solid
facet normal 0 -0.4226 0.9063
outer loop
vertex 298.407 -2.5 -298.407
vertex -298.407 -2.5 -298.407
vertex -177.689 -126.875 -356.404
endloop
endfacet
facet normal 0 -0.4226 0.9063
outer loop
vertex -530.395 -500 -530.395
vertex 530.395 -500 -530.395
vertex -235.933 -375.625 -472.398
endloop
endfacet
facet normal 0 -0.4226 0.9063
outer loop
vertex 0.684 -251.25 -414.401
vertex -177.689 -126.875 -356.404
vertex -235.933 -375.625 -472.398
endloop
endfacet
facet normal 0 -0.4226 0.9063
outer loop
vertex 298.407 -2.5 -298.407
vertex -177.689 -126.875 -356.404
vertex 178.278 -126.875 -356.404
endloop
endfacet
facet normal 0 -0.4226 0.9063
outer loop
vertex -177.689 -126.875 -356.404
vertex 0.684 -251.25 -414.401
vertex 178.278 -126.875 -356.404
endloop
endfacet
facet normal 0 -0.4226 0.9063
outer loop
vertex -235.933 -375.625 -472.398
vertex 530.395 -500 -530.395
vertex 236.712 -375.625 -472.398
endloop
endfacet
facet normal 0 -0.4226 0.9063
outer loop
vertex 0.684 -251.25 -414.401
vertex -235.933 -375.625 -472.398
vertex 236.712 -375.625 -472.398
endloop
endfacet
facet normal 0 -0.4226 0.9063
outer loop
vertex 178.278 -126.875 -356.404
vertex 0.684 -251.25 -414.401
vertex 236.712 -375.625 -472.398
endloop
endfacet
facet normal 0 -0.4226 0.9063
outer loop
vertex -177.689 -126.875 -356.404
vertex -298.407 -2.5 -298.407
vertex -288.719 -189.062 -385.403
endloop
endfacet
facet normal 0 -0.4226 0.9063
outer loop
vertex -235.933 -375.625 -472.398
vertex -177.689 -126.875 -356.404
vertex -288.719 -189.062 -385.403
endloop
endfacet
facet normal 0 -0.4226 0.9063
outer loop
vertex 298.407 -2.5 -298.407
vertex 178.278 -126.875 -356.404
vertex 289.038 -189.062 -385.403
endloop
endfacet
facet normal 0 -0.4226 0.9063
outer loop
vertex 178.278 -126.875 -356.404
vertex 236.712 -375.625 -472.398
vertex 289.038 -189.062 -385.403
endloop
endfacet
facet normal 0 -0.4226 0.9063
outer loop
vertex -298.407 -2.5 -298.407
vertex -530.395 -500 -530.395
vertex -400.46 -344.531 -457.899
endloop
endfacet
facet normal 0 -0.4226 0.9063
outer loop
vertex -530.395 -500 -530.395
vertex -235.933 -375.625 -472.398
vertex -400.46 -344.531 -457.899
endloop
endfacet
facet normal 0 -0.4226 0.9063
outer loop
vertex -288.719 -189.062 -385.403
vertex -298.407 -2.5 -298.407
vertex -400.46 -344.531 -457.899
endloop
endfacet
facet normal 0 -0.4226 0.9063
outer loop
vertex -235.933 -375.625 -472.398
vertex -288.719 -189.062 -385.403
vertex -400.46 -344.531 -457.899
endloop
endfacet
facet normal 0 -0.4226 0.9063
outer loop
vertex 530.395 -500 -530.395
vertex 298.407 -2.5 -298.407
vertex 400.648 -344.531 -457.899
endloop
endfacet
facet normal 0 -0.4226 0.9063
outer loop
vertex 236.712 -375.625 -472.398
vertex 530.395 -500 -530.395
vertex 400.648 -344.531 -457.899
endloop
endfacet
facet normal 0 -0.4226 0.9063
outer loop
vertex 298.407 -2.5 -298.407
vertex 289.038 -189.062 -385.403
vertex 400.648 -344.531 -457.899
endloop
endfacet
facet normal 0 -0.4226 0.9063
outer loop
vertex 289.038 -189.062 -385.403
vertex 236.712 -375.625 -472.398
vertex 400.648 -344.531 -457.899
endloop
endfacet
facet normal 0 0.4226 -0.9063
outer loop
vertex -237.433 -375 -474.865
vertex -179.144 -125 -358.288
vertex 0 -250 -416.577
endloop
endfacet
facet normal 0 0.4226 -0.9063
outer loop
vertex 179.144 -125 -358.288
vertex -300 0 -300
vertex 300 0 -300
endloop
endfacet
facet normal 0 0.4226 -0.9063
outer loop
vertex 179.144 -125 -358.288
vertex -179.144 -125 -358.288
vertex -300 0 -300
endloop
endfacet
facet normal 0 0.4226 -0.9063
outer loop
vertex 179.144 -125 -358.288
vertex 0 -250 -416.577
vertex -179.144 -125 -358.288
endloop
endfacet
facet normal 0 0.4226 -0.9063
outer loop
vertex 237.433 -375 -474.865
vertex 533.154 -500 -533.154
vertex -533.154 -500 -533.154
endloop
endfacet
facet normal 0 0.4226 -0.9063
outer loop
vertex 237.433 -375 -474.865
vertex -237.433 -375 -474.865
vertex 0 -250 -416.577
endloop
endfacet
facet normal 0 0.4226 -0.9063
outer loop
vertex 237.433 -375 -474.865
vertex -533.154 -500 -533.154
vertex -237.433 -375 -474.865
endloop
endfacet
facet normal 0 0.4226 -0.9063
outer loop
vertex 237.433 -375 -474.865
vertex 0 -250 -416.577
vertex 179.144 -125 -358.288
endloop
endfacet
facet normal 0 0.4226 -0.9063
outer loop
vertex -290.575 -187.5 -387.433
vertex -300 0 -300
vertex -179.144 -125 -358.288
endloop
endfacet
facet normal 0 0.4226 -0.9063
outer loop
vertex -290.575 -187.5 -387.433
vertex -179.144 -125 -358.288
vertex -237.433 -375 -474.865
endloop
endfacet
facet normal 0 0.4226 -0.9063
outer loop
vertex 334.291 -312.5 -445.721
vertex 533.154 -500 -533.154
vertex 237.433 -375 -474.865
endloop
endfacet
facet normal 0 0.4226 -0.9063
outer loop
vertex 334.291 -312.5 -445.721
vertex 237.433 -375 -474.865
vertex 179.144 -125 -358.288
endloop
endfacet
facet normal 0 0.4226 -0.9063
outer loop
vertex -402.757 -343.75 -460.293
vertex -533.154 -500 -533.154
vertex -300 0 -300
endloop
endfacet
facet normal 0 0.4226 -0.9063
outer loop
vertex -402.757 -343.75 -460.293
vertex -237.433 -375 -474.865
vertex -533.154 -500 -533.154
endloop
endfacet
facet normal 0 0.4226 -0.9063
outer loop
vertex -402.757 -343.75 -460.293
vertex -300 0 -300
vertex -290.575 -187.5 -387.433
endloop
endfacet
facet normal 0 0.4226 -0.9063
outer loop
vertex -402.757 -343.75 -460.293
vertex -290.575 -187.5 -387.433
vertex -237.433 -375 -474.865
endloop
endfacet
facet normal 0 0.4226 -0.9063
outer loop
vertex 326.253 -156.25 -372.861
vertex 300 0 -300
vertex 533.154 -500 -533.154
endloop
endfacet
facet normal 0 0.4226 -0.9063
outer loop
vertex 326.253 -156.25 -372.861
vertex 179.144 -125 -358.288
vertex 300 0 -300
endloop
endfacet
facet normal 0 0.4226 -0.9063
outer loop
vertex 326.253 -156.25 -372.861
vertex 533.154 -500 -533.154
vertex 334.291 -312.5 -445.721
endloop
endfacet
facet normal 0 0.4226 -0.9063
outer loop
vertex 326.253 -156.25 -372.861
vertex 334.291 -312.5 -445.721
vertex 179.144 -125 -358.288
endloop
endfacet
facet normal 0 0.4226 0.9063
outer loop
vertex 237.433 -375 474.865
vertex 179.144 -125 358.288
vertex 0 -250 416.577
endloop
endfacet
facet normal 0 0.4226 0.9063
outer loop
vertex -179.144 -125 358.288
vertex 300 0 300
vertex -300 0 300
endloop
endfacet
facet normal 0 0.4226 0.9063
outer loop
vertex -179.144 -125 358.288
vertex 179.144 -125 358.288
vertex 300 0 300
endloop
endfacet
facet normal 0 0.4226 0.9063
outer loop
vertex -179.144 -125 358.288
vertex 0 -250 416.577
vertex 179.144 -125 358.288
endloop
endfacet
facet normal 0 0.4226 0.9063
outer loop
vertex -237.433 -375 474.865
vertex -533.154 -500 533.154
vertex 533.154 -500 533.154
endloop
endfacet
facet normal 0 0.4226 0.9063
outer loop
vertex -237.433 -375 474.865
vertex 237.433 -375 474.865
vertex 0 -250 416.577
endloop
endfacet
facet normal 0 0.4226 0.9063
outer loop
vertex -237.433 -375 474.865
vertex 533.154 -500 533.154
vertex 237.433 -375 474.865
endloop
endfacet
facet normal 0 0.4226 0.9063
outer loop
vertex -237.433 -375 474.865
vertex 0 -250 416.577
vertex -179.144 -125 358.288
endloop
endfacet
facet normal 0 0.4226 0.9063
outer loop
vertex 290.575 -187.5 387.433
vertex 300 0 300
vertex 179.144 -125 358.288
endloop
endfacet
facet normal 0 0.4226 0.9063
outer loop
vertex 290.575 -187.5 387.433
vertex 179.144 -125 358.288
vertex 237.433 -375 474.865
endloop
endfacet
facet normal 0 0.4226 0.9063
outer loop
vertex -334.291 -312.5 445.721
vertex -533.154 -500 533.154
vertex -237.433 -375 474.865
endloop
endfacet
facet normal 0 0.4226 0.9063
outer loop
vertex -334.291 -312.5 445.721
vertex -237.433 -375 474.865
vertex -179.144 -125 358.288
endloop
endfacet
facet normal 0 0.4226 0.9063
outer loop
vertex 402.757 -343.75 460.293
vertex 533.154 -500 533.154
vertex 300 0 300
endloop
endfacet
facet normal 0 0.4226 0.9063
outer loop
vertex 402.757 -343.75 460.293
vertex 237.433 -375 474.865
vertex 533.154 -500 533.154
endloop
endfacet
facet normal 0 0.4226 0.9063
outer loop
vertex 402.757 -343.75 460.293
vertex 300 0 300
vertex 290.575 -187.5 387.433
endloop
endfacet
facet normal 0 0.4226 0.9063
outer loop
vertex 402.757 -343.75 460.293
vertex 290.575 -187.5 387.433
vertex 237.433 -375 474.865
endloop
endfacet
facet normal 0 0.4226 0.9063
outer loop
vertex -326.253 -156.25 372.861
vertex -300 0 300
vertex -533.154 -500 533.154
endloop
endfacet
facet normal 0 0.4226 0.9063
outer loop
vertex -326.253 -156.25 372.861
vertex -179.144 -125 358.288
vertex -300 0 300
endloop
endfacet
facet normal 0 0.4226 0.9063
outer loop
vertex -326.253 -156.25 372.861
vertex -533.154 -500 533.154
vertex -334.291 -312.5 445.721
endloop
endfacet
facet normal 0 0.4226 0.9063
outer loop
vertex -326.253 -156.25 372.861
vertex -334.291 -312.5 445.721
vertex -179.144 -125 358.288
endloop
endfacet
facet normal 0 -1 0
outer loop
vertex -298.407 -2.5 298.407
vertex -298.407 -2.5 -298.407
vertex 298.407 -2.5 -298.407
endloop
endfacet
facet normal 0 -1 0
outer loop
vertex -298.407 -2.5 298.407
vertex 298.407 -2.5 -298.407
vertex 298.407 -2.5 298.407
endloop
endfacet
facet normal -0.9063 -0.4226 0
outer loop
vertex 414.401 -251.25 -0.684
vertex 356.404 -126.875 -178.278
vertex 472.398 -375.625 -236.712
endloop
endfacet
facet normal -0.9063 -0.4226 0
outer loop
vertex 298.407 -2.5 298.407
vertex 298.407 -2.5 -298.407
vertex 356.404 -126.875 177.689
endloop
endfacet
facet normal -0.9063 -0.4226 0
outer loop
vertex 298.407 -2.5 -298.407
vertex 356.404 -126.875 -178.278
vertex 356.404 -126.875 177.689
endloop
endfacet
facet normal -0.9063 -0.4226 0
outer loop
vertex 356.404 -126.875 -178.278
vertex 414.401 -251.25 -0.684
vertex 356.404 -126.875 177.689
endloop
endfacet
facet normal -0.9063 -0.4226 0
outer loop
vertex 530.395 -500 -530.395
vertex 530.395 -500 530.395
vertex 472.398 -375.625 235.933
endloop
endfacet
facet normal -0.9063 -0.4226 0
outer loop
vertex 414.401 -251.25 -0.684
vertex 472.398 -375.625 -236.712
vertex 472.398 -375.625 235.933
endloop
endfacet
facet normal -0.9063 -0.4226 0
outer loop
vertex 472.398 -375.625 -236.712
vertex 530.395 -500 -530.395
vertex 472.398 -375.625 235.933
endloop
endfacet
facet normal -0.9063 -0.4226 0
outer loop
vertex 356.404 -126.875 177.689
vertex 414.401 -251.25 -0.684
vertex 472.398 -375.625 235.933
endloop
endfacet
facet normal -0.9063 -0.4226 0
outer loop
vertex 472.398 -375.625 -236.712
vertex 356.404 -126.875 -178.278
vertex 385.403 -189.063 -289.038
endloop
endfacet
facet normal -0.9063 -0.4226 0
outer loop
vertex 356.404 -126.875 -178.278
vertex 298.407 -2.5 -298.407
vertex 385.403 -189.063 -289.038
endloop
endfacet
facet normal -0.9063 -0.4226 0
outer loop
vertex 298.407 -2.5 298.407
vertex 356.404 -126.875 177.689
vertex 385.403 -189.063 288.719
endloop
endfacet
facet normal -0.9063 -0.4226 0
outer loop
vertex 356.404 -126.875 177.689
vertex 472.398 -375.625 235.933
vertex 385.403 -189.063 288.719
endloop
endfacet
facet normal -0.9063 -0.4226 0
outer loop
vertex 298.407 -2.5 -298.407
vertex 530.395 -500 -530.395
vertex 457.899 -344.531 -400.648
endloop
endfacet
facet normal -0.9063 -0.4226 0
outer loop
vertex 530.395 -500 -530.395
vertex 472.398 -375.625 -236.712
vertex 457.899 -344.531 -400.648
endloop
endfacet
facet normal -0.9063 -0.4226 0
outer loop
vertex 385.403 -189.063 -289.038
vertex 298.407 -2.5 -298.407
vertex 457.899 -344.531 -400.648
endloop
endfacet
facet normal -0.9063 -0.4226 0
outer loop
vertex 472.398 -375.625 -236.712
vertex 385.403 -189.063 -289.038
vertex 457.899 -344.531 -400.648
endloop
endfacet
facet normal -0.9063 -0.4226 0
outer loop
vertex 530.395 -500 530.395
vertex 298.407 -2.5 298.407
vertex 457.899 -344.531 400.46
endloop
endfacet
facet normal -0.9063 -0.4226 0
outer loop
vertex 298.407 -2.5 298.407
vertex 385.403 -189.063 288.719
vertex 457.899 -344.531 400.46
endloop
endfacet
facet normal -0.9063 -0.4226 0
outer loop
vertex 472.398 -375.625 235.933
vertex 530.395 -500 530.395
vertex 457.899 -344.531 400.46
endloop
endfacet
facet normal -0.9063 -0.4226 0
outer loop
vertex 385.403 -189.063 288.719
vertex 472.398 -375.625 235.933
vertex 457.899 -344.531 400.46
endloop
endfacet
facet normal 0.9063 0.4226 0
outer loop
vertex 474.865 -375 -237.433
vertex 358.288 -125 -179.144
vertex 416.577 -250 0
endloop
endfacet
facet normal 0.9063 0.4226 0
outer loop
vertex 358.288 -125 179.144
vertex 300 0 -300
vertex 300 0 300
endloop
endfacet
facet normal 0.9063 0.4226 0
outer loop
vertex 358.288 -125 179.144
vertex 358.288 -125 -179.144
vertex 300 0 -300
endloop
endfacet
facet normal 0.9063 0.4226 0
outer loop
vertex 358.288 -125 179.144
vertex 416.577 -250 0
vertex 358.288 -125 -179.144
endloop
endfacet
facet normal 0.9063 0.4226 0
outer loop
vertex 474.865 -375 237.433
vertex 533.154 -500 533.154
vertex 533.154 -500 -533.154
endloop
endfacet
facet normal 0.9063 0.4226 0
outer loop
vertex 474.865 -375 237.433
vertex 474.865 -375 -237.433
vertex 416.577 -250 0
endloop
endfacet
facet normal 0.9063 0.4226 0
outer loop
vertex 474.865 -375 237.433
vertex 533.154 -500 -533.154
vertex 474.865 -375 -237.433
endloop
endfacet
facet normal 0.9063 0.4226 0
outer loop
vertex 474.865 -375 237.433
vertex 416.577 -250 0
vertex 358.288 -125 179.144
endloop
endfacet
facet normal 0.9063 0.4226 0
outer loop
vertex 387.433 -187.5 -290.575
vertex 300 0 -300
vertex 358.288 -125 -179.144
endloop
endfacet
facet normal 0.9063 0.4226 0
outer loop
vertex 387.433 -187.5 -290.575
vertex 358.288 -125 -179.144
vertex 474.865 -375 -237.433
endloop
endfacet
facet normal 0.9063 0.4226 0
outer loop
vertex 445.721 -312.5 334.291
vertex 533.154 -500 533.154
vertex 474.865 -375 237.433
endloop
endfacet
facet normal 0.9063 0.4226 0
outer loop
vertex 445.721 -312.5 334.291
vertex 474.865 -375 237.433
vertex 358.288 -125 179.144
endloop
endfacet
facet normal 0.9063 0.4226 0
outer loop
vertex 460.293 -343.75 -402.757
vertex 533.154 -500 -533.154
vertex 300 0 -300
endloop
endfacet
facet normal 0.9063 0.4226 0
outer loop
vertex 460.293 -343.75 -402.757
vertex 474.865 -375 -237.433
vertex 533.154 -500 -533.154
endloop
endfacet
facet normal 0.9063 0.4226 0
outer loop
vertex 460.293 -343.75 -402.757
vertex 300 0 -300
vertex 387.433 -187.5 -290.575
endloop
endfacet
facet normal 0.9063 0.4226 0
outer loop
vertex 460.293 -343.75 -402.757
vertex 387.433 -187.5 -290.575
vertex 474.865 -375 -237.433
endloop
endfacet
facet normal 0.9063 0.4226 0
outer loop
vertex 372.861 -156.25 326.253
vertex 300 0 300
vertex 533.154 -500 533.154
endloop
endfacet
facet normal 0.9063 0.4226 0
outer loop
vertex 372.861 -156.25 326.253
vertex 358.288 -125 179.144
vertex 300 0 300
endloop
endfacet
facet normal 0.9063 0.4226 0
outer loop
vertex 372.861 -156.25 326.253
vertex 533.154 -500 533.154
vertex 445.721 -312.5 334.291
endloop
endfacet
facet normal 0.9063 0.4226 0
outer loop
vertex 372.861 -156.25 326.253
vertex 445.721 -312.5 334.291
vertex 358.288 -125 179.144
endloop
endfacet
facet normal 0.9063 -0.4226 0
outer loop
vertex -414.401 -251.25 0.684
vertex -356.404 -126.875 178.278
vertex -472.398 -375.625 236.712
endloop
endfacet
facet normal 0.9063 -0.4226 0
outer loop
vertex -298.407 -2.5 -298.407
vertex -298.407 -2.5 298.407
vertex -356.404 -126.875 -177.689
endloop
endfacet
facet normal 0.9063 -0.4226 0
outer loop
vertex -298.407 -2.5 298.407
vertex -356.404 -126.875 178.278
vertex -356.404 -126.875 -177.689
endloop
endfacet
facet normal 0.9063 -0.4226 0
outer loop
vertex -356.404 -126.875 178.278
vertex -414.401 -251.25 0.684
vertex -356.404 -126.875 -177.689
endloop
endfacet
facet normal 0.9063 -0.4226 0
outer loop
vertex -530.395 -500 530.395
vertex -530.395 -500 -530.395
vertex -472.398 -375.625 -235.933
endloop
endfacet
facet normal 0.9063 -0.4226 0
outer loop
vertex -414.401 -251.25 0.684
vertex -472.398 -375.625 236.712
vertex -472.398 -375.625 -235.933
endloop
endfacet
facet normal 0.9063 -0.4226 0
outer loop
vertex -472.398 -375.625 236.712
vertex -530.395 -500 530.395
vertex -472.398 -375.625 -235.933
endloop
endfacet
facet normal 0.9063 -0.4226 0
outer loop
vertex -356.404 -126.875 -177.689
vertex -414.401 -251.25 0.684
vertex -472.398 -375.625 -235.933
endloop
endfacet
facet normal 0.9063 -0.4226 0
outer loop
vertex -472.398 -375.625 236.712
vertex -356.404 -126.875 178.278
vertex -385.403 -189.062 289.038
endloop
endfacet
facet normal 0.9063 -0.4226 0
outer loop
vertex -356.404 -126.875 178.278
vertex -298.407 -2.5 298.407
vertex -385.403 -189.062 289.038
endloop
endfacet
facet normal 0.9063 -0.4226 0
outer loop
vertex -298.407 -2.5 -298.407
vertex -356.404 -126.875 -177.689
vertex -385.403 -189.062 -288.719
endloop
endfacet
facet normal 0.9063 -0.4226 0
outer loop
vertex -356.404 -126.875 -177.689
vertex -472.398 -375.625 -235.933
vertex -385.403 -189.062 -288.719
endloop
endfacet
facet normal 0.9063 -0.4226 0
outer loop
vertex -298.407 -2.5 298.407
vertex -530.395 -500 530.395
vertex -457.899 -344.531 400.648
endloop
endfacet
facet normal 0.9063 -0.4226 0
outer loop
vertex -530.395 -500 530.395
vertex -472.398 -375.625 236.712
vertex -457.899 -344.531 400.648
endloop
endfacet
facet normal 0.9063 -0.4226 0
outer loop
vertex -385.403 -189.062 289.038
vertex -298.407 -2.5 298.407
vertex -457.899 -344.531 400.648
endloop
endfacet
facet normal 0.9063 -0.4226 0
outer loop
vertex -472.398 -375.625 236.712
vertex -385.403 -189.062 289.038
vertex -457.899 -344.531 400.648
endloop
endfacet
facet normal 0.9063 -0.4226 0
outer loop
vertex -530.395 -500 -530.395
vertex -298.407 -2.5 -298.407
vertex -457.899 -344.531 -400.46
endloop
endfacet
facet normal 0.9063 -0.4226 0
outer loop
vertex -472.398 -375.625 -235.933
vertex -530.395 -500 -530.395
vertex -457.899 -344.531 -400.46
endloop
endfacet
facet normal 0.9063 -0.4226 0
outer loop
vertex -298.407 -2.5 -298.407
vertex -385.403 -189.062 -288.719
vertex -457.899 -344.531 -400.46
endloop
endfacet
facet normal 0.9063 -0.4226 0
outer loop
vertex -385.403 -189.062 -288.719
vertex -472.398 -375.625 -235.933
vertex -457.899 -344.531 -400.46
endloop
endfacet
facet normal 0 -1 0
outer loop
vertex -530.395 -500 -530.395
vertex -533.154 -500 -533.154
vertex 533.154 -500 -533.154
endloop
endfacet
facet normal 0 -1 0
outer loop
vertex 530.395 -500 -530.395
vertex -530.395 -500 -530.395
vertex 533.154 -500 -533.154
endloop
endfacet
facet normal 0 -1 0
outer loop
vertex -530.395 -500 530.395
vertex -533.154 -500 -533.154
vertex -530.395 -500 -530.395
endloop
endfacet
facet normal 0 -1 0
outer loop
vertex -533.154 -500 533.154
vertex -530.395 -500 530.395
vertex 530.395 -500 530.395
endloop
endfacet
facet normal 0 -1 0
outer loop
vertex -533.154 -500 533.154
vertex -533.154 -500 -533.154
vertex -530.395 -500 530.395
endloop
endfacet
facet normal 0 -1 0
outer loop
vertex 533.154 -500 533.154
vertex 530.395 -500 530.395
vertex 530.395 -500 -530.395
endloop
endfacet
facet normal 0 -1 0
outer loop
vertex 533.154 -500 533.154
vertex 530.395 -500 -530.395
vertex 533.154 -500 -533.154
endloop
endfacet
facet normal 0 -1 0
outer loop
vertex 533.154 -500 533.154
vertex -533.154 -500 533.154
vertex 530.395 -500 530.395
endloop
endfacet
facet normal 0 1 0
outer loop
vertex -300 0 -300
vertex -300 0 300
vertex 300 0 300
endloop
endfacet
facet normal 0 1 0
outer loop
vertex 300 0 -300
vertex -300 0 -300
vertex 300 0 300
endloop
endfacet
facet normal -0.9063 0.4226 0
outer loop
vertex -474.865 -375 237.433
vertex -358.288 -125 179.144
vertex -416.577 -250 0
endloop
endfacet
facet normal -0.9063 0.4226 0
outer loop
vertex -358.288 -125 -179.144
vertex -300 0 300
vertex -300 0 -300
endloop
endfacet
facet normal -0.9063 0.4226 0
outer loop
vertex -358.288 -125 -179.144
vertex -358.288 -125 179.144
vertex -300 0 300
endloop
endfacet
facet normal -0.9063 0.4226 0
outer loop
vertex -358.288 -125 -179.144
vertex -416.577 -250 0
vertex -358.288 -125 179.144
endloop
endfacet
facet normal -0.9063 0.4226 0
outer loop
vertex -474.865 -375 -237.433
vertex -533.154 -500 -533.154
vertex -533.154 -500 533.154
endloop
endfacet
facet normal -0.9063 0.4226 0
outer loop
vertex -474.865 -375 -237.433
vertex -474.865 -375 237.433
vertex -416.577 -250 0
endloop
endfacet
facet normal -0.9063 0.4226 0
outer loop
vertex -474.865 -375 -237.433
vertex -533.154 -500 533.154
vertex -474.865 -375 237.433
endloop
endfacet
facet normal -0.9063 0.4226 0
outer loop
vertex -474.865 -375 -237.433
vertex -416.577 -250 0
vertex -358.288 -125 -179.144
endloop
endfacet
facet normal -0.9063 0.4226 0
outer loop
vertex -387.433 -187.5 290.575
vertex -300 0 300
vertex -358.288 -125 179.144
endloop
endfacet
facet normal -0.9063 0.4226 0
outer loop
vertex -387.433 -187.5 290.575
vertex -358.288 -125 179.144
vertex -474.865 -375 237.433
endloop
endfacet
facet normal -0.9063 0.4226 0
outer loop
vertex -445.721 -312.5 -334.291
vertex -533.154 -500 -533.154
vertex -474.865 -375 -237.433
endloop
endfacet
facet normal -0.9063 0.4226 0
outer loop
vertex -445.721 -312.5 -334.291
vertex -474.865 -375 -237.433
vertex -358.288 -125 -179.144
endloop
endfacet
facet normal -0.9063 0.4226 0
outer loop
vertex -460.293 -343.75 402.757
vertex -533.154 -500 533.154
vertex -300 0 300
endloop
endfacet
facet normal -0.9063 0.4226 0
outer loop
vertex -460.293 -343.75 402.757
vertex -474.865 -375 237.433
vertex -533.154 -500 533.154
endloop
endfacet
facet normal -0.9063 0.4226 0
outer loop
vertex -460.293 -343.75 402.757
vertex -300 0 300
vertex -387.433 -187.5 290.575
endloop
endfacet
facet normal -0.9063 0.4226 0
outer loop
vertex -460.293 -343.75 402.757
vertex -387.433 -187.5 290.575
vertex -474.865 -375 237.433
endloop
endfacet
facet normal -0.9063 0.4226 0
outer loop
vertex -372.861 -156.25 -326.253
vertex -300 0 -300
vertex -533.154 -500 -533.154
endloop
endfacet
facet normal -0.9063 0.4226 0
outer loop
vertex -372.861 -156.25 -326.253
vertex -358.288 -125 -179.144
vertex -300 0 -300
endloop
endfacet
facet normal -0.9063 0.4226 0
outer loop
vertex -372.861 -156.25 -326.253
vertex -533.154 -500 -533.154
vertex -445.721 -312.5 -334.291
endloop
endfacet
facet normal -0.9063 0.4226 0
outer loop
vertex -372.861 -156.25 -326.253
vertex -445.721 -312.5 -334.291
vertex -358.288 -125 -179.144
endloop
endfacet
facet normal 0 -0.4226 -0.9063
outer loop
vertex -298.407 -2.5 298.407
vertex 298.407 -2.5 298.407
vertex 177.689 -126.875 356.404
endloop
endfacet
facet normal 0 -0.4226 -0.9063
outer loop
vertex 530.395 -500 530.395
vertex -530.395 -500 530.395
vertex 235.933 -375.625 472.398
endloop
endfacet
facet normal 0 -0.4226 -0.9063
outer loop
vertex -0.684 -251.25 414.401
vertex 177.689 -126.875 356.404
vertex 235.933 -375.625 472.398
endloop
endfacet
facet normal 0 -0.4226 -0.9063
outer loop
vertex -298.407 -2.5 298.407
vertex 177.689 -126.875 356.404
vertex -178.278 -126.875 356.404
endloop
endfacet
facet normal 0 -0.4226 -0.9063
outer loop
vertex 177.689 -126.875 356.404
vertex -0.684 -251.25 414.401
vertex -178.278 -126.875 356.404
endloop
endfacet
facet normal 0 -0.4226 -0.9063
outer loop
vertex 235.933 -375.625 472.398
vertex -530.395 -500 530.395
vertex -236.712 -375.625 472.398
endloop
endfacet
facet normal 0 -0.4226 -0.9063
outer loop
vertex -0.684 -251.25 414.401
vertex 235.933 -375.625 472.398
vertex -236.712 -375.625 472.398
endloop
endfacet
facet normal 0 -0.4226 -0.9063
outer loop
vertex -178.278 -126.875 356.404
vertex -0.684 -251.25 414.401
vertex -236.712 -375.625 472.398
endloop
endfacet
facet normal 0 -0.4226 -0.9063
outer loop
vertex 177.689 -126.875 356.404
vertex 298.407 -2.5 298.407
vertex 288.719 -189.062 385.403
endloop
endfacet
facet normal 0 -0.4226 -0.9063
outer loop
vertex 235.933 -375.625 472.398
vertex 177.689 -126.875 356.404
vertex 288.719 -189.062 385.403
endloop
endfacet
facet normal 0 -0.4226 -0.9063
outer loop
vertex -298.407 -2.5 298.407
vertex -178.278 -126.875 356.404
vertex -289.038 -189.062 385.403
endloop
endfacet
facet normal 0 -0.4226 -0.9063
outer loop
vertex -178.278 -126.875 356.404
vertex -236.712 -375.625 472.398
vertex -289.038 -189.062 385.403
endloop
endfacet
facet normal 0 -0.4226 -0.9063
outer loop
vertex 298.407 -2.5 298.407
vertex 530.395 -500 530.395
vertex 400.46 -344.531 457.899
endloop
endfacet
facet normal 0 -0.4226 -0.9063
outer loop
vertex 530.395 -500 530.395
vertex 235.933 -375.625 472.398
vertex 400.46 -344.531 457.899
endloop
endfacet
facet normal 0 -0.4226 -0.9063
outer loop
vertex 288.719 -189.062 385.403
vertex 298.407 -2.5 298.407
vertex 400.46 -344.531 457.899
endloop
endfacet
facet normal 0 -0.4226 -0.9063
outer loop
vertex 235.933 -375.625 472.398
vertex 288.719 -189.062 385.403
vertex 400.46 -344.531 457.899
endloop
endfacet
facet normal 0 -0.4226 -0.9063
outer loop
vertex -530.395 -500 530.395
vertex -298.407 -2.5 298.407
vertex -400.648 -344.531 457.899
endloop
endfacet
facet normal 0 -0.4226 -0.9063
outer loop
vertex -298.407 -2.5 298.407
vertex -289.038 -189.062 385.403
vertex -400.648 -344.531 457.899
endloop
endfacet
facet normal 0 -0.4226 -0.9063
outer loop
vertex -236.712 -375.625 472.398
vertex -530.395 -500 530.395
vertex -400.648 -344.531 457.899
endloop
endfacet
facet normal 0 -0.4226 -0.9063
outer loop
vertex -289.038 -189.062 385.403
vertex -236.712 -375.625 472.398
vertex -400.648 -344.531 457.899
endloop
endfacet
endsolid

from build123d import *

# Parameters (mm, degrees)
F0_W     = 600
F0_H     = 600
F1_DEPTH = 500
F1_TAPER = -25
F2_T     = -2.5


with BuildPart() as f1:
    # F0 (on Front) → F1 (new body)
    with BuildSketch(Plane.XZ):
        Rectangle(F0_W, F0_H)
    extrude(amount=F1_DEPTH, taper=F1_TAPER)

    # F2
    f2_openings = [f1.faces().sort_by_distance(p)[0] for p in [
        (0, -500, 0),
    ]]
    offset(amount=F2_T, openings=f2_openings, kind=Kind.INTERSECTION)


solid = f1.part
